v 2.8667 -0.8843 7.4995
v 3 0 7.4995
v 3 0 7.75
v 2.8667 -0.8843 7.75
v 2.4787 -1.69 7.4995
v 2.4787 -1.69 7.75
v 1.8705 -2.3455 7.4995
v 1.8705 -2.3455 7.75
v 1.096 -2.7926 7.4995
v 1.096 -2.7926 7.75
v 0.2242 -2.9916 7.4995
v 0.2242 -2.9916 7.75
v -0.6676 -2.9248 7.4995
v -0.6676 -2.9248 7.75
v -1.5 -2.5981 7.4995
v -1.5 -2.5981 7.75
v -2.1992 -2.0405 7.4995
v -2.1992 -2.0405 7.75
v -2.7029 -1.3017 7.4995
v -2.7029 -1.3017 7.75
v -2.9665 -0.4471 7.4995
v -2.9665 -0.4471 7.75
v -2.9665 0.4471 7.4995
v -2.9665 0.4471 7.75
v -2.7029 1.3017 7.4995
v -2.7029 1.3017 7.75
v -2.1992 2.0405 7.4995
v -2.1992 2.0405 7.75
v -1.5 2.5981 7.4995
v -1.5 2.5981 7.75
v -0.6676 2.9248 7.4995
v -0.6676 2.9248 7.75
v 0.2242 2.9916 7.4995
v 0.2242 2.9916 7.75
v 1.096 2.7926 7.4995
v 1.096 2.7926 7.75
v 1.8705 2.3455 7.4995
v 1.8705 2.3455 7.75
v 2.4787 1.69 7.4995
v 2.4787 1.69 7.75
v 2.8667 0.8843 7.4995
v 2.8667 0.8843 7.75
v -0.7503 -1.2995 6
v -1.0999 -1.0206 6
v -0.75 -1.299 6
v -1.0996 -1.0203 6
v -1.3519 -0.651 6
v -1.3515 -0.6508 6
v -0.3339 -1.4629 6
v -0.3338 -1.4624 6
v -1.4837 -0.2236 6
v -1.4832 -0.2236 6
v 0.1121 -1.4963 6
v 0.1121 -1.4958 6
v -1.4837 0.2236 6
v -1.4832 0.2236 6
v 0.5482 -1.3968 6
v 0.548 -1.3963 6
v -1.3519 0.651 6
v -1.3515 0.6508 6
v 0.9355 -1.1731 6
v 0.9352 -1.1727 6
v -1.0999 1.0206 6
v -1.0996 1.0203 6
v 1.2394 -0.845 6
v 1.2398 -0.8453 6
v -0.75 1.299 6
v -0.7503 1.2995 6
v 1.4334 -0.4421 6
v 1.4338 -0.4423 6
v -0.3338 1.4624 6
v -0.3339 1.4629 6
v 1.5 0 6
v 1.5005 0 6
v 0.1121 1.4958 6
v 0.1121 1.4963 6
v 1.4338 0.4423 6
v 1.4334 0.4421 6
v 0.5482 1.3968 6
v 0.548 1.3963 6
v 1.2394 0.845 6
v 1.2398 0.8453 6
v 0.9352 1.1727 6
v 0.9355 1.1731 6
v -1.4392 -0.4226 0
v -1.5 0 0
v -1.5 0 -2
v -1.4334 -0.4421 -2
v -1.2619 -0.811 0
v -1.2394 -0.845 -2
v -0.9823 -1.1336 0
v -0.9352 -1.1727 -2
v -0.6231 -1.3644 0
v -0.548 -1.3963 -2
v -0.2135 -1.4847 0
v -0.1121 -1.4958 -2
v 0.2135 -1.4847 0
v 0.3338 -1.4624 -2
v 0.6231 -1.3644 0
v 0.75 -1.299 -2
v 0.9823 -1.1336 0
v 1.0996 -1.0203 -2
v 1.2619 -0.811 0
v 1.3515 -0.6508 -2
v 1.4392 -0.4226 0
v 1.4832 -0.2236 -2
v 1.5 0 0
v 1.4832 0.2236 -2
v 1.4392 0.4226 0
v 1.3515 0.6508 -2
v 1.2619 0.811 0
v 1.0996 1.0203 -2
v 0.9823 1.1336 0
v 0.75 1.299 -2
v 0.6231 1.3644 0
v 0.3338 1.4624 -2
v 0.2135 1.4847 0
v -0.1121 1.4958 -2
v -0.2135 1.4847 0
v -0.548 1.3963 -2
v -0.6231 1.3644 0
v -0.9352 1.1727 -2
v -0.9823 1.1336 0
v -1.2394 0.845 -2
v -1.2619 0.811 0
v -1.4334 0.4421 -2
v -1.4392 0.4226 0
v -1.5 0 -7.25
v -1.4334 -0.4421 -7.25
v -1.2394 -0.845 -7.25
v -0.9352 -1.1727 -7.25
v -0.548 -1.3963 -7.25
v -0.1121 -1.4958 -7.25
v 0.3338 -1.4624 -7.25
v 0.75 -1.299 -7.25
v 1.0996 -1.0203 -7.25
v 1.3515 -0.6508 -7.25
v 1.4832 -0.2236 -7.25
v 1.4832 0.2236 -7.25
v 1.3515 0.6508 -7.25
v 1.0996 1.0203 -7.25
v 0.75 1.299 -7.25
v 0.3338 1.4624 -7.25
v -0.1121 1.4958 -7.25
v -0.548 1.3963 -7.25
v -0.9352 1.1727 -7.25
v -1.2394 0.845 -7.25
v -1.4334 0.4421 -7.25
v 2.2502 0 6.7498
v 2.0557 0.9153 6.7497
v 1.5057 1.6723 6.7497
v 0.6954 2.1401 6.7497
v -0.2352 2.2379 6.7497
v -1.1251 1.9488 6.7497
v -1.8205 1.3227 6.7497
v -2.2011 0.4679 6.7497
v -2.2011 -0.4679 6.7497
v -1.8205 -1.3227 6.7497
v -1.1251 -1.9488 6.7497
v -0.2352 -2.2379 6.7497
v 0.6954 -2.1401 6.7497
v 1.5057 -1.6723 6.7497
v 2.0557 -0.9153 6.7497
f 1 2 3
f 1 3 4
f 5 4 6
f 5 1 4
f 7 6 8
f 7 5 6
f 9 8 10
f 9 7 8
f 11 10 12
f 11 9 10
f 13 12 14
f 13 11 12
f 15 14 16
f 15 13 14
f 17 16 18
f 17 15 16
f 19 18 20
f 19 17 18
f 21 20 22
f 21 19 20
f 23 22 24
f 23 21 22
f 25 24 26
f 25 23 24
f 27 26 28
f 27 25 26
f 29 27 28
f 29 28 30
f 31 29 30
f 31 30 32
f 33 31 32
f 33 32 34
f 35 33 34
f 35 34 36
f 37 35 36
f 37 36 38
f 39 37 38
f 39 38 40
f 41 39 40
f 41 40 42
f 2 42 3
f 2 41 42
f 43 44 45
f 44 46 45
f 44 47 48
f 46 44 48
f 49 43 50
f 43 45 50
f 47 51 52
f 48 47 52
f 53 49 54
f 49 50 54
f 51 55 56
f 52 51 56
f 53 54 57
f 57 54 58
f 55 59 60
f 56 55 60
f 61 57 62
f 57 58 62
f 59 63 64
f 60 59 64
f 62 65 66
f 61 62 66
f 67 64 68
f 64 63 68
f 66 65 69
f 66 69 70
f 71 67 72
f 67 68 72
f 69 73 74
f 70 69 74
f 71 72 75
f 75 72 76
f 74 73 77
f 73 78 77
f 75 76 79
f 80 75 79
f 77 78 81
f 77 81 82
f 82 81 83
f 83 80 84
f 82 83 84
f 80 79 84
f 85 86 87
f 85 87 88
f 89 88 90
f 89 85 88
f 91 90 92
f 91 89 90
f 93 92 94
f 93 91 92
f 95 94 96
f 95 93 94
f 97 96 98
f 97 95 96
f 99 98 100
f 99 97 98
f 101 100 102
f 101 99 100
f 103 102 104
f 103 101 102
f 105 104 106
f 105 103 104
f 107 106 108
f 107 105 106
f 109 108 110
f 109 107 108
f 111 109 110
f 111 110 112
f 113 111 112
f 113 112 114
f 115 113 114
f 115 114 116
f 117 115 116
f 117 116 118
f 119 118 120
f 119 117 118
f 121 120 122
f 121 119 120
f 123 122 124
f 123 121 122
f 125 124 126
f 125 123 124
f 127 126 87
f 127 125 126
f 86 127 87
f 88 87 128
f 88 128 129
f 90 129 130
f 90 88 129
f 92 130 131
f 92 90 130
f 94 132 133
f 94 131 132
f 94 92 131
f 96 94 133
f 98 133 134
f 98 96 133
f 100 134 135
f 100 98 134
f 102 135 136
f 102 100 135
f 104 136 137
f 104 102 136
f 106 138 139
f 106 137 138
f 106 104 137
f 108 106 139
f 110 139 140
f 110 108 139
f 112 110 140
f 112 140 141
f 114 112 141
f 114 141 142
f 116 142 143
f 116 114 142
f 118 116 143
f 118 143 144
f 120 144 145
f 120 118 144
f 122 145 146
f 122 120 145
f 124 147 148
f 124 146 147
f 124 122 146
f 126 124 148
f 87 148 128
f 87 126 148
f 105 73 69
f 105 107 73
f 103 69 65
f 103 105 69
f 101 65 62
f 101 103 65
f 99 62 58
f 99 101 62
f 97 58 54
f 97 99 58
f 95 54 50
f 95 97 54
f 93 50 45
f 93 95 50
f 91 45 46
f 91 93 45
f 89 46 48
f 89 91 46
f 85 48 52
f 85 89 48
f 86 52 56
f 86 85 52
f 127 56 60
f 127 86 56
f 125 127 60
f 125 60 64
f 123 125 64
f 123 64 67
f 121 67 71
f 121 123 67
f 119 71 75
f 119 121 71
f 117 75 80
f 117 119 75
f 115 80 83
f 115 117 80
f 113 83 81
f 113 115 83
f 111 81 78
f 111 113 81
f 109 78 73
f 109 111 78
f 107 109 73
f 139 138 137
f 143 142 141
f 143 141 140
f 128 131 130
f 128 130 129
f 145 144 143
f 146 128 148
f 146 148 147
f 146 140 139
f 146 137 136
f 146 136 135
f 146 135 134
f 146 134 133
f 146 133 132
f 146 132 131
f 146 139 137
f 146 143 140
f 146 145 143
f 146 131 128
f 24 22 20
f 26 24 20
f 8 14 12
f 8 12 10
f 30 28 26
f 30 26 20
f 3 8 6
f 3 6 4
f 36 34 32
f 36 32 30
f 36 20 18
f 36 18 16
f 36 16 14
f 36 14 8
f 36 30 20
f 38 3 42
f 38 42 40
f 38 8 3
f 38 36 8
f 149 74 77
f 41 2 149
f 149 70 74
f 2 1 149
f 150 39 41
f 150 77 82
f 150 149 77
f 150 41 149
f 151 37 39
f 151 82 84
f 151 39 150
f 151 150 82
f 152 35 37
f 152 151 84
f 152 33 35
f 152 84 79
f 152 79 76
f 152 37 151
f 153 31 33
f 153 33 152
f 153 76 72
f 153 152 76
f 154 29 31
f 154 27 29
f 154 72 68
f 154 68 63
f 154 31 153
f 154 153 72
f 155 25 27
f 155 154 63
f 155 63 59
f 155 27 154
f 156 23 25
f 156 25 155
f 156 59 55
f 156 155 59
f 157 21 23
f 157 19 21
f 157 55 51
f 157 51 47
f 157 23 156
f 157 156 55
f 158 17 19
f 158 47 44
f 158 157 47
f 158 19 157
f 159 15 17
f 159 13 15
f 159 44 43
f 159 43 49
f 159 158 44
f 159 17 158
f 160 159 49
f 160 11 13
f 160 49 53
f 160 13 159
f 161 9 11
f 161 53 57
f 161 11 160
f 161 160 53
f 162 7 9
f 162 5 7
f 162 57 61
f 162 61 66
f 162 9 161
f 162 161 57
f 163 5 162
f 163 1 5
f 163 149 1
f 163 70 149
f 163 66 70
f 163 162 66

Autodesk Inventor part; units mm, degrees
ref_plane "YZ Plane" through (0, 0, 0) normal (1, 0, 0) x (0, 1, 0)
ref_plane "XZ Plane" through (0, 0, 0) normal (0, 1, 0) x (-1, 0, 0)
ref_plane "XY Plane" through (0, 0, 0) normal (0, 0, 1) x (1, 0, 0)
sketch "スケッチ1" plane through (0, 0, 0) normal (0, 0, 1) x (1, 0, 0)
  circle A0 centre (0, 0) radius 1.5
  dimension "d0" = 3
extrude "押し出し1" add sketch "スケッチ1" along normal blind 6
sketch "スケッチ2" plane through (0, 0, 6) normal (0, 0, 1) x (1, 0, 0)
  circle A0 centre (0, 0) radius 1.5 projected
  circle A1 centre (0, 0) radius 3
  dimension "d3" = 6
extrude "押し出し2" add sketch "スケッチ2" along normal blind 1.75 contours A0 | A1
thread "ねじ1" size "M3x0.5" class "6g" standard "ANSI Metric M Profile" full length
chamfer "面取り1" distance 1.5 angle 45 1 edges at (-3, 0, 6)
sketch "スケッチ4" plane through (0, 0, 0) normal (0, 0, -1) x (-1, 0, 0)
  circle A0 centre (0, 0) radius 1.5 projected
extrude "押し出し4" add sketch "スケッチ4" along normal blind 4
sketch "スケッチ5" plane through (0, 0, -4) normal (0, 0, -1) x (-1, 0, 0)
  circle A0 centre (0, 0) radius 1.5 projected
extrude "押し出し5" cut sketch "スケッチ5" against normal blind 2
sketch "スケッチ6" plane through (0, 0, -2) normal (0, 0, -1) x (-1, 0, 0)
  circle A0 centre (0, 0) radius 1.5 projected
extrude "押し出し6" add sketch "スケッチ6" along normal blind 5.25
properties part number "SB　15mm皿ネジ" material "Steel, Mild"
